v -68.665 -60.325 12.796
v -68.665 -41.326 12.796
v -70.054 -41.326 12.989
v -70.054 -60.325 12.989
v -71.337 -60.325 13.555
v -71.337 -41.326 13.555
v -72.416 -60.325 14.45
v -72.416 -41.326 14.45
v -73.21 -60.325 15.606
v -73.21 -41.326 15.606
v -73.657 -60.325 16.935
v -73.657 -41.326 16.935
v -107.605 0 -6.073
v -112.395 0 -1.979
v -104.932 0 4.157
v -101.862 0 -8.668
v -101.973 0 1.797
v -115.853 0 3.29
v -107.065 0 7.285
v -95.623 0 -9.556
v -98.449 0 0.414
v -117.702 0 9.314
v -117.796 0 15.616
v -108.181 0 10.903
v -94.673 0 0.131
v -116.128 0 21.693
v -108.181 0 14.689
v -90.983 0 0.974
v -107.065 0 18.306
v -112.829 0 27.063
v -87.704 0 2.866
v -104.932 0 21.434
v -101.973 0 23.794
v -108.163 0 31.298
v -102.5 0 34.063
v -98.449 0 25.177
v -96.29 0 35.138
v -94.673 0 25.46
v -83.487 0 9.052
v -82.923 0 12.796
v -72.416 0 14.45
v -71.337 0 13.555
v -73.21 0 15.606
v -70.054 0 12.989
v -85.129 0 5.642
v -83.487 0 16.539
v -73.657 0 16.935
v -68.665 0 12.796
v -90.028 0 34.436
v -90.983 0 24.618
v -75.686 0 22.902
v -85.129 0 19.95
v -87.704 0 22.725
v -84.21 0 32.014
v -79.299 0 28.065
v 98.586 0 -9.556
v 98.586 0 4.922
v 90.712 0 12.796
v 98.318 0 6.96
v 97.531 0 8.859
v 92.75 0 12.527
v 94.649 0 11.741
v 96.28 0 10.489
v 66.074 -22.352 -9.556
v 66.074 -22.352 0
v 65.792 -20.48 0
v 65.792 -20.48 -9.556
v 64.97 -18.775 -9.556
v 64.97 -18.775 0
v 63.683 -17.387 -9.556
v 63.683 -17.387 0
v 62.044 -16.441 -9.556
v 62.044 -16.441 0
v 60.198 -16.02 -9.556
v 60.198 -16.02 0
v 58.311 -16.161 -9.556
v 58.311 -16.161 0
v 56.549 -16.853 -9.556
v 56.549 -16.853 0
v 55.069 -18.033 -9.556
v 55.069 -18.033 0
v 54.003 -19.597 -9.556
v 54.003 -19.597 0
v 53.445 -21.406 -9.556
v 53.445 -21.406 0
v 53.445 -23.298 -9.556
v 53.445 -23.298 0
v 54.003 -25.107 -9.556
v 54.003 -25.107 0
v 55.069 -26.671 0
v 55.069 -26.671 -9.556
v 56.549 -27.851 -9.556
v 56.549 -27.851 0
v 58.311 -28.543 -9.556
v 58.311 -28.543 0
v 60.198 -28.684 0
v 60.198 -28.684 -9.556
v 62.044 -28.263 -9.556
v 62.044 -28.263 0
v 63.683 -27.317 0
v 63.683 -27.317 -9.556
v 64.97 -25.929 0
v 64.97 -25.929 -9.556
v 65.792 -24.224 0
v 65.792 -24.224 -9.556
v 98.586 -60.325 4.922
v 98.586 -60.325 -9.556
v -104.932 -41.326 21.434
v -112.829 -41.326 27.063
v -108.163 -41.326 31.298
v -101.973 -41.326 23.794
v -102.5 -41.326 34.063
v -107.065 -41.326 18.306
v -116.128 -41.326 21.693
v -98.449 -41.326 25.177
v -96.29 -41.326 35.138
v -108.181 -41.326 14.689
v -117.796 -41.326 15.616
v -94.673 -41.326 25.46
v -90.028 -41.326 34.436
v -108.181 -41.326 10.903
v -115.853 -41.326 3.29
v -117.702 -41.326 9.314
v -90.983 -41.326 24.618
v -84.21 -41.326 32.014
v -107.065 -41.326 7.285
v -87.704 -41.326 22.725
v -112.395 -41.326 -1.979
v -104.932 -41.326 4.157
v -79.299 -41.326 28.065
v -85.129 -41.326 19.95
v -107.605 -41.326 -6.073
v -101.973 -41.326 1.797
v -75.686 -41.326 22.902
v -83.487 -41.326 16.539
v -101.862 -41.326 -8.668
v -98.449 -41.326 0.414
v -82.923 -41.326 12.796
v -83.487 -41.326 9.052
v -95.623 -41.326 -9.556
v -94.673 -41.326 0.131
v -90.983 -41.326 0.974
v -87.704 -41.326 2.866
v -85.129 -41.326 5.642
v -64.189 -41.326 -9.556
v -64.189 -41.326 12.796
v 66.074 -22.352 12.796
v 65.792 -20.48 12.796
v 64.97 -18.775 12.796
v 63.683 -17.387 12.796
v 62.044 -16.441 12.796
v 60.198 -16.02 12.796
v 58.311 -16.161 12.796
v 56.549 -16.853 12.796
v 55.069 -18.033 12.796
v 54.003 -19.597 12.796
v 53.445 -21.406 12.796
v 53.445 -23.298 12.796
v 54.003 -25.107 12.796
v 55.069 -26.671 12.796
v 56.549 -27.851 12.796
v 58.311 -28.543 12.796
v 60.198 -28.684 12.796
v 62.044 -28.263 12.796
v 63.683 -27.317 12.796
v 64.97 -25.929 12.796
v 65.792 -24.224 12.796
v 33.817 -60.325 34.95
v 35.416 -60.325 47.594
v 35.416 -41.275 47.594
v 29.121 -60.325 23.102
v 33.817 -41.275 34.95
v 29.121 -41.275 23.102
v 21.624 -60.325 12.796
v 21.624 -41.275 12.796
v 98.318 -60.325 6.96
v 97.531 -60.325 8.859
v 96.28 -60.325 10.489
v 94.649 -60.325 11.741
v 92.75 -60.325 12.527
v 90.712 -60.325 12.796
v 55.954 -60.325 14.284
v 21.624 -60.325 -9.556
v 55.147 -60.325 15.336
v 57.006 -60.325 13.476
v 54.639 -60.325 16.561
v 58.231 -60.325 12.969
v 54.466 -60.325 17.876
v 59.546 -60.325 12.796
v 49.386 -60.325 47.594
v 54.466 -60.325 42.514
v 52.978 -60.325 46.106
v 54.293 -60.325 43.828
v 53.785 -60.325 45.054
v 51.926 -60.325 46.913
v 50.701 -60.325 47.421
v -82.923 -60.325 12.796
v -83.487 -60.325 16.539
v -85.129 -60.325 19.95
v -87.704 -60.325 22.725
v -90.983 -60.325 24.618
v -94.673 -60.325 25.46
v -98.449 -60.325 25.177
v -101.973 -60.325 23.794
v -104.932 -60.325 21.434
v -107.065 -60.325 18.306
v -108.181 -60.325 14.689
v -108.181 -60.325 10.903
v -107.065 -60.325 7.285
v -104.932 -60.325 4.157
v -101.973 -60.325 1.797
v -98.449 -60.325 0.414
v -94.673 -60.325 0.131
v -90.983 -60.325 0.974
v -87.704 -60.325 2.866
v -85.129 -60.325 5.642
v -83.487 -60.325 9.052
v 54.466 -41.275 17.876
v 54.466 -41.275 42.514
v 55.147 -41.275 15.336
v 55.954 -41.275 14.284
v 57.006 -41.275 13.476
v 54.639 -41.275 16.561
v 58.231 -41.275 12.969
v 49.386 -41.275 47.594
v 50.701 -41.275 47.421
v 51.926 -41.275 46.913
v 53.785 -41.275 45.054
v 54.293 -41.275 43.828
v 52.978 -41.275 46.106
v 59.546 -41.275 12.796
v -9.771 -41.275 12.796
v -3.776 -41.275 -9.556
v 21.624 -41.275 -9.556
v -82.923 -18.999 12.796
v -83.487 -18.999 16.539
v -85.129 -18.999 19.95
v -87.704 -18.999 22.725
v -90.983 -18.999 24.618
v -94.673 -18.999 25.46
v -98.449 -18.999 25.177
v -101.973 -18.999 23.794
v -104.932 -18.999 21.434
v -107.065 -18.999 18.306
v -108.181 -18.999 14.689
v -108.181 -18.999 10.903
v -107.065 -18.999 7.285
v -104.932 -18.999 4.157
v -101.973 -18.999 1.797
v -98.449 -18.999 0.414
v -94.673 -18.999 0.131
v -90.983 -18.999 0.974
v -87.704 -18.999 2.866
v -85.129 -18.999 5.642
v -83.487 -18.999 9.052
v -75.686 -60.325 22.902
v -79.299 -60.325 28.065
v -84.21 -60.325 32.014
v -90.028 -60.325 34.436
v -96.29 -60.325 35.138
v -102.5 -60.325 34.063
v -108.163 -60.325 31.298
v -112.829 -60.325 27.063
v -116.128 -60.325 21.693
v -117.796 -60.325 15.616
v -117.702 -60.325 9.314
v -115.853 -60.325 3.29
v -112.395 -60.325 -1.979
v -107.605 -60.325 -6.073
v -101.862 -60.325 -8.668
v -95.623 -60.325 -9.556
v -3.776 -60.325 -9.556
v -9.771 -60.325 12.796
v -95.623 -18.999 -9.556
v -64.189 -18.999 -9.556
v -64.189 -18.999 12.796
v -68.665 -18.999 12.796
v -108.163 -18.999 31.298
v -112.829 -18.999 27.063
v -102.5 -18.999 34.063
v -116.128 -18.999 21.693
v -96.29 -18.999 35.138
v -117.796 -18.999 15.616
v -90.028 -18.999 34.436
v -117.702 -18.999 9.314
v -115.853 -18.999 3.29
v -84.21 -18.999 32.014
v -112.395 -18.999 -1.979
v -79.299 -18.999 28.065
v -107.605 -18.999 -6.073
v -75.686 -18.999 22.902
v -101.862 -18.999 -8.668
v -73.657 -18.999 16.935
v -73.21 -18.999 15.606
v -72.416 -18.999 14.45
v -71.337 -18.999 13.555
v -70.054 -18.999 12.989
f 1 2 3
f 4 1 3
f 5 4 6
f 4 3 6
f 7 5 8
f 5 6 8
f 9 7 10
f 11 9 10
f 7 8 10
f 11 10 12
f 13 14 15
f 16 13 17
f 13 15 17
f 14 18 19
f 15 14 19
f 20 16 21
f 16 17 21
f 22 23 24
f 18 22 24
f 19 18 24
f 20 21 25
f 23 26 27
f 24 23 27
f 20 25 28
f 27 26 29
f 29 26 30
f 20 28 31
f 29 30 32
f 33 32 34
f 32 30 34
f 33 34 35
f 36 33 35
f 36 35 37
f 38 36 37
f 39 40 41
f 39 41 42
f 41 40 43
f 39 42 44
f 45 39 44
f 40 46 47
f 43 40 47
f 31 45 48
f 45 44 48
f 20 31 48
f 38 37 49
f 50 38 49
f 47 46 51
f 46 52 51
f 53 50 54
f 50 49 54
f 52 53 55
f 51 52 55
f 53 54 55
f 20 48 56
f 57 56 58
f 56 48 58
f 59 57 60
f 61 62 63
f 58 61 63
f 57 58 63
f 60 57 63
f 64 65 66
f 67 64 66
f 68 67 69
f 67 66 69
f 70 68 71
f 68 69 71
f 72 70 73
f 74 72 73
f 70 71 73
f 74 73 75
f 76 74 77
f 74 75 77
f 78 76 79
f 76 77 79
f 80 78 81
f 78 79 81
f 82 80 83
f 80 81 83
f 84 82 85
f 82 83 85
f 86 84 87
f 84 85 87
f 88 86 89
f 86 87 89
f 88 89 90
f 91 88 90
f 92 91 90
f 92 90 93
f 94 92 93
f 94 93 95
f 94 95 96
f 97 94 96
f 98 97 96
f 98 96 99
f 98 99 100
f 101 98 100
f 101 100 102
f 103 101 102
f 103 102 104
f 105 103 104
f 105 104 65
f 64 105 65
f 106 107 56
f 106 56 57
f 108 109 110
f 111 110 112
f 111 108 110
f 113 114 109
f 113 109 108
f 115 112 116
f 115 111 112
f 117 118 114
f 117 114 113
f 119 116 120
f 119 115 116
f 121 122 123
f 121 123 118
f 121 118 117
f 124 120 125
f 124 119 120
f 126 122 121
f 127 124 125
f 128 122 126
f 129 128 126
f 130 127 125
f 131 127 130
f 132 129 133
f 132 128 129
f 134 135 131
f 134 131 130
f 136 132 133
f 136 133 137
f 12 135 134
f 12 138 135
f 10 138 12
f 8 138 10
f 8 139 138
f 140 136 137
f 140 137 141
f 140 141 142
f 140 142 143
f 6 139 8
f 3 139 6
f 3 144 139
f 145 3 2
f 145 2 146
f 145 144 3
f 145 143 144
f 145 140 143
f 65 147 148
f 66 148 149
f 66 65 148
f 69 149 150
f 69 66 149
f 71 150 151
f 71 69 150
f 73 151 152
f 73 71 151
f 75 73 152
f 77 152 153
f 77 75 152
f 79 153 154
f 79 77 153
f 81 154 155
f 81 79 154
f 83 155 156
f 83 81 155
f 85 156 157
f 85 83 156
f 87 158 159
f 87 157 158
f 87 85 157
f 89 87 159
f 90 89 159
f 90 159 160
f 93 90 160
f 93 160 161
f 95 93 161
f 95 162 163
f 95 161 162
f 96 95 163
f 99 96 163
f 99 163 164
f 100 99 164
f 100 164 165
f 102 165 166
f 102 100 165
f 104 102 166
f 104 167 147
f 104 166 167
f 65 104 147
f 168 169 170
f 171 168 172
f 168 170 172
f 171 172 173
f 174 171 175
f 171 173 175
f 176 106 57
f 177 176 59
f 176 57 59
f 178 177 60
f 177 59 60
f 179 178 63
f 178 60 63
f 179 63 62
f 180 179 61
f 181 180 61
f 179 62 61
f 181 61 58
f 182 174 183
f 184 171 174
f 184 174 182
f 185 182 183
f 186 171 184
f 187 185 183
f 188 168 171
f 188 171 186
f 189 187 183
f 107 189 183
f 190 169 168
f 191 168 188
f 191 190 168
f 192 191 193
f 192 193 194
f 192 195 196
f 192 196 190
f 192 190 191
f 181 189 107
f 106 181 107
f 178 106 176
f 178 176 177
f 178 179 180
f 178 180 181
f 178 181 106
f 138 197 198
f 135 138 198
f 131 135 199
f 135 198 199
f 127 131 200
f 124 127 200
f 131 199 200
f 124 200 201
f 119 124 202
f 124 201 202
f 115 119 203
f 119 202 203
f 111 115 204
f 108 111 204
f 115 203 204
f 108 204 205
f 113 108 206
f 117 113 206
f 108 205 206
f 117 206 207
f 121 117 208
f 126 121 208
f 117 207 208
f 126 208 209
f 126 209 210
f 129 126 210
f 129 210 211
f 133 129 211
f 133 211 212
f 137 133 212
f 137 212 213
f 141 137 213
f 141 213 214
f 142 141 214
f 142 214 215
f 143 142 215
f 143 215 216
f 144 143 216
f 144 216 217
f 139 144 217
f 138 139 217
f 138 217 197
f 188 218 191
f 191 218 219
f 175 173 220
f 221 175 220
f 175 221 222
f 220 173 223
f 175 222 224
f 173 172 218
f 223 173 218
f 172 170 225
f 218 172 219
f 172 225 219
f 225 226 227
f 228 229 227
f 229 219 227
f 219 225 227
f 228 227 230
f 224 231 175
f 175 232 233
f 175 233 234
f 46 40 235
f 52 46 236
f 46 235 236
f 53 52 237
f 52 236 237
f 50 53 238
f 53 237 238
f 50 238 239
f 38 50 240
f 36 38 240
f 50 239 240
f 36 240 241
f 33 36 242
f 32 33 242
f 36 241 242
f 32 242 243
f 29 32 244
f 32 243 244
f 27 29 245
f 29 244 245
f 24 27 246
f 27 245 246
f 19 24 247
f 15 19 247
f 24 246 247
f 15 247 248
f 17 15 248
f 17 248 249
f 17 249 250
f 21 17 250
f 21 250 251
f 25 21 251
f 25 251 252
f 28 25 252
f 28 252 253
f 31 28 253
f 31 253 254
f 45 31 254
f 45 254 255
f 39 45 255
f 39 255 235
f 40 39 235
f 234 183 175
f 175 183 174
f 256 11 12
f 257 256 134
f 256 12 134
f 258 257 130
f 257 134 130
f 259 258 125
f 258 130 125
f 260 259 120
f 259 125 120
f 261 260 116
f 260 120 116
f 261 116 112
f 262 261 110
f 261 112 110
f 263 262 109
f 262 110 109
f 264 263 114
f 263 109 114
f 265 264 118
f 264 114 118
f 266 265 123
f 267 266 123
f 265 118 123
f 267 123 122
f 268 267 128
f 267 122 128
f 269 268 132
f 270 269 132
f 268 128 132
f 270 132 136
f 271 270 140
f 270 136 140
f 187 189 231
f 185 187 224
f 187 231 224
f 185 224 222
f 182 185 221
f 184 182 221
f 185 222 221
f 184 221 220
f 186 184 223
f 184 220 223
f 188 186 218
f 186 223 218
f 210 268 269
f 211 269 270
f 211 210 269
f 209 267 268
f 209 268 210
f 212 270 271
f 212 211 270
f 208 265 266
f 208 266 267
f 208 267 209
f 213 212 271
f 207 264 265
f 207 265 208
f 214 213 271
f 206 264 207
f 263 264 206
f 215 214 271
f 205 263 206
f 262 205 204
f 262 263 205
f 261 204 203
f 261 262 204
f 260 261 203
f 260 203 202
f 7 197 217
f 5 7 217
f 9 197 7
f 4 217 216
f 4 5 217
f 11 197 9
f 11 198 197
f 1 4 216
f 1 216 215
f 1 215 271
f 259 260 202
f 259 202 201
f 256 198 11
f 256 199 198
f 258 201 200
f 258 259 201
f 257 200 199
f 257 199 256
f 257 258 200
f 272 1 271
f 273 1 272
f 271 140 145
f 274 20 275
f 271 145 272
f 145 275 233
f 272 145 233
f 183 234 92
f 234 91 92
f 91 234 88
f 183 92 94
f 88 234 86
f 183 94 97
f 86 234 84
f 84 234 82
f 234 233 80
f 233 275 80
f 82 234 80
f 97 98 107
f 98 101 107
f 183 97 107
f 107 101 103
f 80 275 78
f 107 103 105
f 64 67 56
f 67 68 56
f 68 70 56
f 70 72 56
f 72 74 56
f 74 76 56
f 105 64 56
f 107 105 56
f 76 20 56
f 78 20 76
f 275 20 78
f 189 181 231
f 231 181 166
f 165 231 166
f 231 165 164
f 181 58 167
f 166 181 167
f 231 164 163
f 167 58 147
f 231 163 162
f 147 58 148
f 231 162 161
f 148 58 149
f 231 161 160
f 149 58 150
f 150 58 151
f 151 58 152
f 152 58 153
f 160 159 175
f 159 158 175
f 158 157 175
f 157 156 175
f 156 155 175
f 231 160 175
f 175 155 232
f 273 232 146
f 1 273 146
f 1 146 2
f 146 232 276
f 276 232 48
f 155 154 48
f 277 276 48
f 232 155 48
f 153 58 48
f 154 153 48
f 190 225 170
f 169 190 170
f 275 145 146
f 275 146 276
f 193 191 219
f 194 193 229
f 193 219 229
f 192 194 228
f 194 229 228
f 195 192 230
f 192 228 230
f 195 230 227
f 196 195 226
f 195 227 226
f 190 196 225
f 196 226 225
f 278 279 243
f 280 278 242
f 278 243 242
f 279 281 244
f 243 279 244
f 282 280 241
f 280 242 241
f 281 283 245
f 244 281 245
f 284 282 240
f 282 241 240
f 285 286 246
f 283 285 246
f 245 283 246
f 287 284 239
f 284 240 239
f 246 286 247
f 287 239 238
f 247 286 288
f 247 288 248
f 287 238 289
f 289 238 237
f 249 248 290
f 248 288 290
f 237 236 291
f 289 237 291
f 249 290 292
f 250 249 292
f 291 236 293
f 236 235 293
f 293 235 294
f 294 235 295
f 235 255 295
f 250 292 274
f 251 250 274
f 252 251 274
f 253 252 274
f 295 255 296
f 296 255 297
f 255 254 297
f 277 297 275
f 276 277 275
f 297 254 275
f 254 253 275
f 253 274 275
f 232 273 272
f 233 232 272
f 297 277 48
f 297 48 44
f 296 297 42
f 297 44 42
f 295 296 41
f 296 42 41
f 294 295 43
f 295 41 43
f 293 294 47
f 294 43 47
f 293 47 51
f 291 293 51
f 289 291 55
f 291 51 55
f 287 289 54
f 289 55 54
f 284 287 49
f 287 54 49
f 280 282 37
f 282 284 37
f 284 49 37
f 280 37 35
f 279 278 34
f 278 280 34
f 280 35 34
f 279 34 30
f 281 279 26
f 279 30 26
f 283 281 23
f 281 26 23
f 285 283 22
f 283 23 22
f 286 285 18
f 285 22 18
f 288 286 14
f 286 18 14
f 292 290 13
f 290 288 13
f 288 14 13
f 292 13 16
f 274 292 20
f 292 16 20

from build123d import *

# Parameters (mm, degrees)
F1_DEPTH      = 60.325
F2_R          = 12.7
F3_DEPTH      = 60.326
F4_DEPTH      = 19.05
F5_W          = 37.9222
F5_H          = 41.275
F6_DEPTH      = 34.798
F7_R          = 6.35
F7_W          = 53.7857485574
F7_H          = 22.3266
F8_DEPTH      = 9.5573214296
F8_DEPTH_BACK = 47.5946785704


with BuildPart() as f1:
    # F0 (on Front) → F1 (new body)
    with BuildSketch(Plane.XZ):
        with BuildLine():
            ThreePointArc((-68.6650304641, 12.7956785704), (-71.9075169357, 13.9650927471), (-73.6571649634, 16.9349378297))
            ThreePointArc((-73.6571649634, 16.9349378297), (-112.8291343827, 27.0626190455), (-95.6225567601, -9.5563214296))
            Line((-95.6225567601, -9.5563214296), (98.5858432399, -9.5563214296))
            Line((98.5858432399, -9.5563214296), (98.5858432399, 4.9216785704))
            ThreePointArc((98.5858432399, 4.9216785704), (96.279602035, 10.4894373655), (90.7118432399, 12.7956785704))
            Line((90.7118432399, 12.7956785704), (59.5460432399, 12.7956785704))
            ThreePointArc((59.5460432399, 12.7956785704), (55.9539407915, 14.283576122), (54.4660432399, 17.8756785704))
            Line((54.4660432399, 17.8756785704), (54.4660432399, 42.5136785704))
            ThreePointArc((54.4660432399, 42.5136785704), (52.9781456883, 46.1057810189), (49.3860432399, 47.5936785704))
            Line((49.3860432399, 47.5936785704), (35.4160432399, 47.5936785704))
            ThreePointArc((35.4160432399, 47.5936785704), (31.8418586015, 28.8780362045), (21.6238432399, 12.7956785704))
            Line((21.6238432399, 12.7956785704), (-68.6650304641, 12.7956785704))
        make_face()
    extrude(amount=F1_DEPTH)

    # F2 (on face) → F3 (cut, through all)
    with BuildSketch(Plane.XZ.offset(60.325)):
        with Locations((-95.6225567601, 12.7956785704)):
            Circle(F2_R)
    extrude(amount=-F3_DEPTH, mode=Mode.SUBTRACT)

    # F2 (on face) → F4 (cut)
    with BuildSketch(Plane.XZ.offset(60.325)):
        Polygon((21.6238432399, 12.7956785704), (-9.7705567601, 12.7956785704), (-3.7761567601, -9.5563214296), (21.6238432399, -9.5563214296), align=None)
    extrude(amount=-F4_DEPTH, mode=Mode.SUBTRACT)

    # F5 (on face) → F6 (cut)
    with BuildSketch(Plane.XY.offset(47.5936785704)):
        with Locations((40.5849432399, -20.6375)):
            Rectangle(F5_W, F5_H)
    extrude(amount=-F6_DEPTH, mode=Mode.SUBTRACT)

    # F7 (on Top) → F8 (cut, two sides)
    with BuildSketch(Plane.XY) as f8_sk:
        with Locations((59.7238432399, -22.352)):
            Circle(F7_R)
        with Locations((-91.0816824814, -30.1625)):
            Rectangle(F7_W, F7_H)
    extrude(amount=-F8_DEPTH, mode=Mode.SUBTRACT)
    extrude(f8_sk.sketch, amount=F8_DEPTH_BACK, mode=Mode.SUBTRACT)


solid = f1.part
